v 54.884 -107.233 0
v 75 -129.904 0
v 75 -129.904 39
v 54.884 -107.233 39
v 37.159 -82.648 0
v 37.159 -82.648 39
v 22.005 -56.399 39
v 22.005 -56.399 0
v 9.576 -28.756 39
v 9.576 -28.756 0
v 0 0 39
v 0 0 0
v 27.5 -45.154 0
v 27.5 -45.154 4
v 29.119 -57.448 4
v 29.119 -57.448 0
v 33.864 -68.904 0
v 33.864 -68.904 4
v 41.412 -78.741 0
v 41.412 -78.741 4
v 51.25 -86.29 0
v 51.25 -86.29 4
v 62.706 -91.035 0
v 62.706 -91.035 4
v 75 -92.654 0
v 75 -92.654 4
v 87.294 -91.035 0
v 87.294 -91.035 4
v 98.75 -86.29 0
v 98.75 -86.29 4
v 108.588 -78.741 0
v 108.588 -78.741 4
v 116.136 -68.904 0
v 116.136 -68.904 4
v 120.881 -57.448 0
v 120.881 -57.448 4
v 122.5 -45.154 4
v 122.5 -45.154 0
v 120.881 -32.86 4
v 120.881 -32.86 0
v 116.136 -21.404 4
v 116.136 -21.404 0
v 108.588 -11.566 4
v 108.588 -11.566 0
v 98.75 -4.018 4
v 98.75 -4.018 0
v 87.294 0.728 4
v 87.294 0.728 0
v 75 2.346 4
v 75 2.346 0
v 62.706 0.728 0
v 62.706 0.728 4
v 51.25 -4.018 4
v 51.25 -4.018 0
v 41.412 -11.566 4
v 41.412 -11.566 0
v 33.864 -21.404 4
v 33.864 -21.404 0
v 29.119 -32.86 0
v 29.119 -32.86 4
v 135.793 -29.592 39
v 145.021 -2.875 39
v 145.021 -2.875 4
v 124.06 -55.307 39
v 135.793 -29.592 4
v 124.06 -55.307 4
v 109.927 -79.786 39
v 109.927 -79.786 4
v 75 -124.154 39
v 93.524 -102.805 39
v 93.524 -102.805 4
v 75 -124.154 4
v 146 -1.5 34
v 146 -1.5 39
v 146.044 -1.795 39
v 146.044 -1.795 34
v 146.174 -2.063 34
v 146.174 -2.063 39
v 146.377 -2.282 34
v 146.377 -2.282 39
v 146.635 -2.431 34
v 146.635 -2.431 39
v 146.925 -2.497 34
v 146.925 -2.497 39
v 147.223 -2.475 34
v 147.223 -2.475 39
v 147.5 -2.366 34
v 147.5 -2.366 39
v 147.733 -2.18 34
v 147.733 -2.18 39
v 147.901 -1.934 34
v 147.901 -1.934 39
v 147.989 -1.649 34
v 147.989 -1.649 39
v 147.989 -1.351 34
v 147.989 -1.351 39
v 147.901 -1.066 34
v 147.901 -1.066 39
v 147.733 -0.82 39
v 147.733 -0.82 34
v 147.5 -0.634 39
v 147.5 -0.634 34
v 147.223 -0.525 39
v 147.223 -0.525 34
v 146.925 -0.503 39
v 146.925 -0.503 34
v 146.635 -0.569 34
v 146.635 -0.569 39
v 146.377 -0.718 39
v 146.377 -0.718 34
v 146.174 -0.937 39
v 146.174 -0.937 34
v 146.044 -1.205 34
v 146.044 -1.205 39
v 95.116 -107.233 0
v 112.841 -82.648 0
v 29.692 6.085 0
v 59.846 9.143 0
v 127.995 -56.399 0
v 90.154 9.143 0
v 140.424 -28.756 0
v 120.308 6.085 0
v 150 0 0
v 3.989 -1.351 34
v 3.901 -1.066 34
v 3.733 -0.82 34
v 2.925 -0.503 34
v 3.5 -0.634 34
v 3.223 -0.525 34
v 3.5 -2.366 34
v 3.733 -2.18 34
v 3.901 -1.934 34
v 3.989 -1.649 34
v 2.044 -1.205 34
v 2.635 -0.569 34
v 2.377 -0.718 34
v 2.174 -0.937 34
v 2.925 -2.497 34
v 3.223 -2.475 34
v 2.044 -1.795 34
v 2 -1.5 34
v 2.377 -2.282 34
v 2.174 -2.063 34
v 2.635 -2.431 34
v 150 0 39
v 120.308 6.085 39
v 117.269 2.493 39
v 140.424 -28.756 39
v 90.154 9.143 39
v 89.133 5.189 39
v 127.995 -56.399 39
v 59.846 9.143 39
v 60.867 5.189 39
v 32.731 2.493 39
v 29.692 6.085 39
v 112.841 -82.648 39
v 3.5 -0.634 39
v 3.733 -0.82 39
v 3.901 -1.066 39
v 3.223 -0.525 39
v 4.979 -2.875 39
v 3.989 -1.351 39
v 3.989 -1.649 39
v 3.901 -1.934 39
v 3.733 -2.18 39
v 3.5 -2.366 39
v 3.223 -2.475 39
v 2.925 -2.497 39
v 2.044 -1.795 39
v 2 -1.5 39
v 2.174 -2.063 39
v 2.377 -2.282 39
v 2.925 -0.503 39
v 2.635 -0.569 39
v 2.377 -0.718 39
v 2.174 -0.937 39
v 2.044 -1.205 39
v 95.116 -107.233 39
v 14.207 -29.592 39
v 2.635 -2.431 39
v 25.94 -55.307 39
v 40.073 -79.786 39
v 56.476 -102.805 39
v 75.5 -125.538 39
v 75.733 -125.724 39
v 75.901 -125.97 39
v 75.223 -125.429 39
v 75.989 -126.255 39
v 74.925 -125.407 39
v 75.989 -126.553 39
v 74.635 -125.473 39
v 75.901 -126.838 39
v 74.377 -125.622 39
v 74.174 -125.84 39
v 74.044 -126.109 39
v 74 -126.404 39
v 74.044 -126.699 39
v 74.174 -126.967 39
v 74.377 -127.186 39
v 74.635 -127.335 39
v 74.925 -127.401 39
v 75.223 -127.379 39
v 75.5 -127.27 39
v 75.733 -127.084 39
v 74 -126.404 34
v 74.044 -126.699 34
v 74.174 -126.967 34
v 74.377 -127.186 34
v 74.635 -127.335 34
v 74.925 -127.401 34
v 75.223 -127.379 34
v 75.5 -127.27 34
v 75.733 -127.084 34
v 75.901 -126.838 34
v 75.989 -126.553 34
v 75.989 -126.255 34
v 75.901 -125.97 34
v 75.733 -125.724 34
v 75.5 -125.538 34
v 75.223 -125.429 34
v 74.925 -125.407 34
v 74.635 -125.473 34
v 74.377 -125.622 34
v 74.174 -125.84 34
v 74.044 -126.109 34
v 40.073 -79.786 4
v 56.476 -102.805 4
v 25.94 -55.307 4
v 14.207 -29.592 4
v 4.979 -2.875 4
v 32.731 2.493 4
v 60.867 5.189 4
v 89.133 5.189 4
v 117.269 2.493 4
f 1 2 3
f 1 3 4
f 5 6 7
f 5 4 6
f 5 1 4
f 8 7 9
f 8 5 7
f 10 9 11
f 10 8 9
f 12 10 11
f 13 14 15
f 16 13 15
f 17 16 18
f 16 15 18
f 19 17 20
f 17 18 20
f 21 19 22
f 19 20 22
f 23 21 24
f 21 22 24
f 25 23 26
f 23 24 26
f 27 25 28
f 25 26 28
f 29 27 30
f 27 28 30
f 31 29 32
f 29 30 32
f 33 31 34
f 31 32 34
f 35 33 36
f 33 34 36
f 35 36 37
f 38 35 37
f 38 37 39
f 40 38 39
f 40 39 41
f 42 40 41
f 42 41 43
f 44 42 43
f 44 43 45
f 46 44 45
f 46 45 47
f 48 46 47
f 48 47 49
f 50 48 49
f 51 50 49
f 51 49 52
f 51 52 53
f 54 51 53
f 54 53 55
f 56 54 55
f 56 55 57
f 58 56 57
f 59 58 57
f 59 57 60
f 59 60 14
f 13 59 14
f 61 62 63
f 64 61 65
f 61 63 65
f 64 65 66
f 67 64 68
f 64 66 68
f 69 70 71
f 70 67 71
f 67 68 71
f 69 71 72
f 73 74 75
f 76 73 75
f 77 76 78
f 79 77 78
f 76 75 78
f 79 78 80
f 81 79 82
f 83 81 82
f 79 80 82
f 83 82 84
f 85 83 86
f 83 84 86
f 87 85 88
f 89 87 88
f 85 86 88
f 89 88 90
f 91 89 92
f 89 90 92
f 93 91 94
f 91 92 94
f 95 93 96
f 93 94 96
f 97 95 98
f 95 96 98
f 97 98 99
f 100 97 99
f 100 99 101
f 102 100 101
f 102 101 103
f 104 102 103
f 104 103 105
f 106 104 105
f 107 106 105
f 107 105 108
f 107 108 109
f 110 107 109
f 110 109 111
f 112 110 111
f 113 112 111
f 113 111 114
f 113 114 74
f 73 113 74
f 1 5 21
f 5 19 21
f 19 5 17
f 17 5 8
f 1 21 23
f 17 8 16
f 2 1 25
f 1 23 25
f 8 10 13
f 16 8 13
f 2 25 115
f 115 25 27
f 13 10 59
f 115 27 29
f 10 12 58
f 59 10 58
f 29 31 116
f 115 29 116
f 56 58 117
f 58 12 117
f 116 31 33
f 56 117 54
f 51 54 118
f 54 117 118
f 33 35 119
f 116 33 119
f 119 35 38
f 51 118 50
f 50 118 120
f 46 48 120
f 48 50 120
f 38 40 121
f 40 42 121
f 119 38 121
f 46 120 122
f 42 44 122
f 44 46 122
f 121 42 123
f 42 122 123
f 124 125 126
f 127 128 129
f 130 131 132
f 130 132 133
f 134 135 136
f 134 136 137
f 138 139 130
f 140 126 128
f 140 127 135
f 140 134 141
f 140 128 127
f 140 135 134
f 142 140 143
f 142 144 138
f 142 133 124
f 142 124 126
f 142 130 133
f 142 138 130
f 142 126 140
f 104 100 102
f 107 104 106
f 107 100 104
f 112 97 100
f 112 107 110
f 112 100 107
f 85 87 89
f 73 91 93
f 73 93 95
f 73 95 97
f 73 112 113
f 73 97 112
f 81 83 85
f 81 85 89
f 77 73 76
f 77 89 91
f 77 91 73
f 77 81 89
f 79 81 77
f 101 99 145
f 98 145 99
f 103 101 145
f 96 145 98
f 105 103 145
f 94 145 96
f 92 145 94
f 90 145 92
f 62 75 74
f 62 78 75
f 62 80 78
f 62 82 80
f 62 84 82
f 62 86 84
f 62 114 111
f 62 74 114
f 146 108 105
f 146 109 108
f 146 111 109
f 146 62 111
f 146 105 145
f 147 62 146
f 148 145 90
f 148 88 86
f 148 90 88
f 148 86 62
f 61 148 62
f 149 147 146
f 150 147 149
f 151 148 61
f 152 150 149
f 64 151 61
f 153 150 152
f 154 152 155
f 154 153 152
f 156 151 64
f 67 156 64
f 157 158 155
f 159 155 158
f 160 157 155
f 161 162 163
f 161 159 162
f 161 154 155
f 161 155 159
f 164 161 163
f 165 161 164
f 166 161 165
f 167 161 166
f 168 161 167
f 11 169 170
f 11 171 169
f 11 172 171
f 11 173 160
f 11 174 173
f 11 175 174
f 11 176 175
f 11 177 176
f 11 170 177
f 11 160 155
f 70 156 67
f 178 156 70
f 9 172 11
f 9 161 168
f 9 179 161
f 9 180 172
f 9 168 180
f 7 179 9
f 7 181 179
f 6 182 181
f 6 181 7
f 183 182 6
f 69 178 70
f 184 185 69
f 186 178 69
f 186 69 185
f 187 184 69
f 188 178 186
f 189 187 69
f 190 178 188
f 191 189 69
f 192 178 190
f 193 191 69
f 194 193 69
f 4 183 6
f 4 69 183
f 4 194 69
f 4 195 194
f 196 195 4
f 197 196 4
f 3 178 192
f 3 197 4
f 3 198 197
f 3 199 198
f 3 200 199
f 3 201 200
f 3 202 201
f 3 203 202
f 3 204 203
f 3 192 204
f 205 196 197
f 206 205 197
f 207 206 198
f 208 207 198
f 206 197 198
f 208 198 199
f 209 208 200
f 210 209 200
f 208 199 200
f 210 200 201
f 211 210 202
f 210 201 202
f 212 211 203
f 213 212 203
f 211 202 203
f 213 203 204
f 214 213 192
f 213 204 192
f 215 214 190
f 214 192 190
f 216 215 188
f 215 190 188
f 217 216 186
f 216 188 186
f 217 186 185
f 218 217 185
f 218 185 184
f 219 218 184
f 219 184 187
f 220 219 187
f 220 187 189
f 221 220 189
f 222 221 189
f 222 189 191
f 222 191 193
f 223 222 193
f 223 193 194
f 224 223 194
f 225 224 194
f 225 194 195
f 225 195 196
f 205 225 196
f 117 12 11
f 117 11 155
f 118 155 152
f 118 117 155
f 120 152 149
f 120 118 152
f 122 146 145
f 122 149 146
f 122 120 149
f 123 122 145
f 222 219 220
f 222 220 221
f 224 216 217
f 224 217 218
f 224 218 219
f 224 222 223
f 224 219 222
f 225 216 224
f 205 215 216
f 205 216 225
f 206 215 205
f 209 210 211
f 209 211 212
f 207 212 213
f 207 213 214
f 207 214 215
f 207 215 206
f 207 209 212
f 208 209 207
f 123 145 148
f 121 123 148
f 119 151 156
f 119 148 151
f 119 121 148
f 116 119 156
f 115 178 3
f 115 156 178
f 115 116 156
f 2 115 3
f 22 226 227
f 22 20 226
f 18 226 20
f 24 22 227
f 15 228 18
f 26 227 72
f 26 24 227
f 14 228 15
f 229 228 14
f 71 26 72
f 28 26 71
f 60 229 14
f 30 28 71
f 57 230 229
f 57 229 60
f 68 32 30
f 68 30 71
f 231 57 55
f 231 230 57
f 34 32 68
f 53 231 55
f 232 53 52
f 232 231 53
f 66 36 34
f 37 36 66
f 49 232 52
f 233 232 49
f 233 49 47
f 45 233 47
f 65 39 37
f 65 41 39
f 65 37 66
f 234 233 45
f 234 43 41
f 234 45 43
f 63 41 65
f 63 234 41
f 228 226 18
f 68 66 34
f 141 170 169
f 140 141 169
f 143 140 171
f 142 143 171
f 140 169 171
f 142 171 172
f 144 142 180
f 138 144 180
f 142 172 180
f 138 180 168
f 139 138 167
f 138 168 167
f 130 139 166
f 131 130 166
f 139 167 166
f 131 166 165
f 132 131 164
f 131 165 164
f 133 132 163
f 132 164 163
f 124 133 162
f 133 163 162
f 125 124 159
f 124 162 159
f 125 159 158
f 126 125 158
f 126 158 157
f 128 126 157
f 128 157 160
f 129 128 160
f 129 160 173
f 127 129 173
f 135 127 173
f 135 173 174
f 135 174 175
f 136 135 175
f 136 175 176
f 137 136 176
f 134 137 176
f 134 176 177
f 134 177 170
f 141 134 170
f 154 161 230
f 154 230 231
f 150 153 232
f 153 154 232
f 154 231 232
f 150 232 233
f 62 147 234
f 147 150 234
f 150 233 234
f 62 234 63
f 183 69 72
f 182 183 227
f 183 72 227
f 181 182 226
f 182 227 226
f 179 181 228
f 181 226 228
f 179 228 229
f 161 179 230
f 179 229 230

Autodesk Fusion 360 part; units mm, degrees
sketch "Base" plane through (0, 0, 0) normal (0, 0, 1) x (1, 0, 0)
  line L0 (0, 0) -> (150, 0)
  line L1 (0, 0) -> (75, -129.9038)
  line L2 (0, 0) -> (150, 0) construction
  line L3 (75, -129.9038) -> (150, 0)
  arc A0 (150, 0) -> (0, 0) centre (75, -290.4738) ccw
  arc A1 (75, -129.9038) -> (150, 0) centre (-139.0576, 80.285) ccw
  arc A2 (0, 0) -> (75, -129.9038) centre (289.0576, 80.285) ccw
  dimension "d1" = 150
  dimension "d3" = 60
  dimension "d4" = 150
  dimension "d5" = 300
  dimension "d7" = 300
  dimension "d8" = 300
extrude "Extrude1" add sketch "Base" along normal blind 4
sketch "Walls" plane through (0, 0, 4) normal (0, 0, 1) x (-1, 0, 0)
  arc A0 (0, 0) -> (-75, 129.9038) centre (-289.0576, -80.285) ccw
  arc A1 (-75, 129.9038) -> (-150, 0) centre (139.0576, -80.285) ccw
  arc A2 (-150, 0) -> (0, 0) centre (-75, 290.4738) ccw
  arc A3 (-75, 124.1541) -> (-145.0206, 2.8749) centre (139.0576, -80.285) ccw
  arc A4 (-145.0206, 2.8749) -> (-4.9794, 2.8749) centre (-75, 290.4738) ccw
  arc A5 (-4.9794, 2.8749) -> (-75, 124.1541) centre (-289.0576, -80.285) ccw
  dimension "d11" = -4
extrude "Extrude2" add sketch "Walls" along normal blind 35
sketch "Cutout" plane through (0, 0, 4) normal (0, 0, 1) x (-1, 0, 0)
  arc A0 (-75, 124.1541) -> (-145.0206, 2.8749) centre (139.0576, -80.285) ccw
  arc A1 (-145.0206, 2.8749) -> (-4.9794, 2.8749) centre (-75, 290.4738) ccw
  arc A2 (-4.9794, 2.8749) -> (-75, 124.1541) centre (-289.0576, -80.285) ccw
  circle A3 centre (-75, 45.1538) radius 47.5
  point P0 (-75, 129.9038)
  dimension "d14" = 95
  dimension "d16" = 84.75
  dimension "d17" = 75
extrude "Extrude3" cut sketch "Cutout" against normal blind 4 contours A3
sketch "Screw holes" plane through (0, 0, 39) normal (0, 0, 1) x (-1, 0, 0)
  arc A0 (-4.9794, 2.8749) -> (-75, 124.1541) centre (-289.0576, -80.285) ccw
  arc A1 (-145.0206, 2.8749) -> (-4.9794, 2.8749) centre (-75, 290.4738) ccw
  arc A2 (-75, 124.1541) -> (-145.0206, 2.8749) centre (139.0576, -80.285) ccw
  arc A3 (-150, 0) -> (0, 0) centre (-75, 290.4738) ccw
  arc A4 (0, 0) -> (-75, 129.9038) centre (-289.0576, -80.285) ccw
  arc A5 (-75, 129.9038) -> (-150, 0) centre (139.0576, -80.285) ccw
  circle A6 centre (-3, 1.5) radius 1
  circle A7 centre (-147, 1.5) radius 1
  circle A8 centre (-75, 126.4038) radius 1
  dimension "d20" = 2
  dimension "d22" = 1.5
  dimension "d23" = 3
  dimension "d24" = 2
  dimension "d25" = 1.5
  dimension "d26" = 3
  dimension "d27" = 2
  dimension "d28" = 3.5
extrude "Extrude4" cut sketch "Screw holes" against normal blind 5 contours A6 | A7 | A8
